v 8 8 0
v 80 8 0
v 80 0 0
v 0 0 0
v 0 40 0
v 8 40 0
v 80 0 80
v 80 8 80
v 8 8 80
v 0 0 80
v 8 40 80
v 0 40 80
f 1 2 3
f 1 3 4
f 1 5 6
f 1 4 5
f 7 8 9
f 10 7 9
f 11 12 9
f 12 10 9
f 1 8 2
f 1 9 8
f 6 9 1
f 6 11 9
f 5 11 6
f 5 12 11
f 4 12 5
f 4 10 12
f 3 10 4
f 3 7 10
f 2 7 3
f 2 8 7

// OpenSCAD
$fn = 32;

// ----------------------------------------------------------------------
// Structural section: angle 80 x 40 mm
// ----------------------------------------------------------------------

// --- parameters (mm) ---
sec_w = 80;               // leg width, X
sec_h = 40;               // leg height, Y
flange_t = 8;             // leg thickness
plate_t = 80;             // cut length, Z (extrusion height)

profile = [[0, 0], [80, 0], [80, 8], [8, 8], [8, 40], [0, 40]];  // primary outline, 6 points, counter clockwise

// --- the one profile operation ---
linear_extrude(height = plate_t) polygon(points = profile);
